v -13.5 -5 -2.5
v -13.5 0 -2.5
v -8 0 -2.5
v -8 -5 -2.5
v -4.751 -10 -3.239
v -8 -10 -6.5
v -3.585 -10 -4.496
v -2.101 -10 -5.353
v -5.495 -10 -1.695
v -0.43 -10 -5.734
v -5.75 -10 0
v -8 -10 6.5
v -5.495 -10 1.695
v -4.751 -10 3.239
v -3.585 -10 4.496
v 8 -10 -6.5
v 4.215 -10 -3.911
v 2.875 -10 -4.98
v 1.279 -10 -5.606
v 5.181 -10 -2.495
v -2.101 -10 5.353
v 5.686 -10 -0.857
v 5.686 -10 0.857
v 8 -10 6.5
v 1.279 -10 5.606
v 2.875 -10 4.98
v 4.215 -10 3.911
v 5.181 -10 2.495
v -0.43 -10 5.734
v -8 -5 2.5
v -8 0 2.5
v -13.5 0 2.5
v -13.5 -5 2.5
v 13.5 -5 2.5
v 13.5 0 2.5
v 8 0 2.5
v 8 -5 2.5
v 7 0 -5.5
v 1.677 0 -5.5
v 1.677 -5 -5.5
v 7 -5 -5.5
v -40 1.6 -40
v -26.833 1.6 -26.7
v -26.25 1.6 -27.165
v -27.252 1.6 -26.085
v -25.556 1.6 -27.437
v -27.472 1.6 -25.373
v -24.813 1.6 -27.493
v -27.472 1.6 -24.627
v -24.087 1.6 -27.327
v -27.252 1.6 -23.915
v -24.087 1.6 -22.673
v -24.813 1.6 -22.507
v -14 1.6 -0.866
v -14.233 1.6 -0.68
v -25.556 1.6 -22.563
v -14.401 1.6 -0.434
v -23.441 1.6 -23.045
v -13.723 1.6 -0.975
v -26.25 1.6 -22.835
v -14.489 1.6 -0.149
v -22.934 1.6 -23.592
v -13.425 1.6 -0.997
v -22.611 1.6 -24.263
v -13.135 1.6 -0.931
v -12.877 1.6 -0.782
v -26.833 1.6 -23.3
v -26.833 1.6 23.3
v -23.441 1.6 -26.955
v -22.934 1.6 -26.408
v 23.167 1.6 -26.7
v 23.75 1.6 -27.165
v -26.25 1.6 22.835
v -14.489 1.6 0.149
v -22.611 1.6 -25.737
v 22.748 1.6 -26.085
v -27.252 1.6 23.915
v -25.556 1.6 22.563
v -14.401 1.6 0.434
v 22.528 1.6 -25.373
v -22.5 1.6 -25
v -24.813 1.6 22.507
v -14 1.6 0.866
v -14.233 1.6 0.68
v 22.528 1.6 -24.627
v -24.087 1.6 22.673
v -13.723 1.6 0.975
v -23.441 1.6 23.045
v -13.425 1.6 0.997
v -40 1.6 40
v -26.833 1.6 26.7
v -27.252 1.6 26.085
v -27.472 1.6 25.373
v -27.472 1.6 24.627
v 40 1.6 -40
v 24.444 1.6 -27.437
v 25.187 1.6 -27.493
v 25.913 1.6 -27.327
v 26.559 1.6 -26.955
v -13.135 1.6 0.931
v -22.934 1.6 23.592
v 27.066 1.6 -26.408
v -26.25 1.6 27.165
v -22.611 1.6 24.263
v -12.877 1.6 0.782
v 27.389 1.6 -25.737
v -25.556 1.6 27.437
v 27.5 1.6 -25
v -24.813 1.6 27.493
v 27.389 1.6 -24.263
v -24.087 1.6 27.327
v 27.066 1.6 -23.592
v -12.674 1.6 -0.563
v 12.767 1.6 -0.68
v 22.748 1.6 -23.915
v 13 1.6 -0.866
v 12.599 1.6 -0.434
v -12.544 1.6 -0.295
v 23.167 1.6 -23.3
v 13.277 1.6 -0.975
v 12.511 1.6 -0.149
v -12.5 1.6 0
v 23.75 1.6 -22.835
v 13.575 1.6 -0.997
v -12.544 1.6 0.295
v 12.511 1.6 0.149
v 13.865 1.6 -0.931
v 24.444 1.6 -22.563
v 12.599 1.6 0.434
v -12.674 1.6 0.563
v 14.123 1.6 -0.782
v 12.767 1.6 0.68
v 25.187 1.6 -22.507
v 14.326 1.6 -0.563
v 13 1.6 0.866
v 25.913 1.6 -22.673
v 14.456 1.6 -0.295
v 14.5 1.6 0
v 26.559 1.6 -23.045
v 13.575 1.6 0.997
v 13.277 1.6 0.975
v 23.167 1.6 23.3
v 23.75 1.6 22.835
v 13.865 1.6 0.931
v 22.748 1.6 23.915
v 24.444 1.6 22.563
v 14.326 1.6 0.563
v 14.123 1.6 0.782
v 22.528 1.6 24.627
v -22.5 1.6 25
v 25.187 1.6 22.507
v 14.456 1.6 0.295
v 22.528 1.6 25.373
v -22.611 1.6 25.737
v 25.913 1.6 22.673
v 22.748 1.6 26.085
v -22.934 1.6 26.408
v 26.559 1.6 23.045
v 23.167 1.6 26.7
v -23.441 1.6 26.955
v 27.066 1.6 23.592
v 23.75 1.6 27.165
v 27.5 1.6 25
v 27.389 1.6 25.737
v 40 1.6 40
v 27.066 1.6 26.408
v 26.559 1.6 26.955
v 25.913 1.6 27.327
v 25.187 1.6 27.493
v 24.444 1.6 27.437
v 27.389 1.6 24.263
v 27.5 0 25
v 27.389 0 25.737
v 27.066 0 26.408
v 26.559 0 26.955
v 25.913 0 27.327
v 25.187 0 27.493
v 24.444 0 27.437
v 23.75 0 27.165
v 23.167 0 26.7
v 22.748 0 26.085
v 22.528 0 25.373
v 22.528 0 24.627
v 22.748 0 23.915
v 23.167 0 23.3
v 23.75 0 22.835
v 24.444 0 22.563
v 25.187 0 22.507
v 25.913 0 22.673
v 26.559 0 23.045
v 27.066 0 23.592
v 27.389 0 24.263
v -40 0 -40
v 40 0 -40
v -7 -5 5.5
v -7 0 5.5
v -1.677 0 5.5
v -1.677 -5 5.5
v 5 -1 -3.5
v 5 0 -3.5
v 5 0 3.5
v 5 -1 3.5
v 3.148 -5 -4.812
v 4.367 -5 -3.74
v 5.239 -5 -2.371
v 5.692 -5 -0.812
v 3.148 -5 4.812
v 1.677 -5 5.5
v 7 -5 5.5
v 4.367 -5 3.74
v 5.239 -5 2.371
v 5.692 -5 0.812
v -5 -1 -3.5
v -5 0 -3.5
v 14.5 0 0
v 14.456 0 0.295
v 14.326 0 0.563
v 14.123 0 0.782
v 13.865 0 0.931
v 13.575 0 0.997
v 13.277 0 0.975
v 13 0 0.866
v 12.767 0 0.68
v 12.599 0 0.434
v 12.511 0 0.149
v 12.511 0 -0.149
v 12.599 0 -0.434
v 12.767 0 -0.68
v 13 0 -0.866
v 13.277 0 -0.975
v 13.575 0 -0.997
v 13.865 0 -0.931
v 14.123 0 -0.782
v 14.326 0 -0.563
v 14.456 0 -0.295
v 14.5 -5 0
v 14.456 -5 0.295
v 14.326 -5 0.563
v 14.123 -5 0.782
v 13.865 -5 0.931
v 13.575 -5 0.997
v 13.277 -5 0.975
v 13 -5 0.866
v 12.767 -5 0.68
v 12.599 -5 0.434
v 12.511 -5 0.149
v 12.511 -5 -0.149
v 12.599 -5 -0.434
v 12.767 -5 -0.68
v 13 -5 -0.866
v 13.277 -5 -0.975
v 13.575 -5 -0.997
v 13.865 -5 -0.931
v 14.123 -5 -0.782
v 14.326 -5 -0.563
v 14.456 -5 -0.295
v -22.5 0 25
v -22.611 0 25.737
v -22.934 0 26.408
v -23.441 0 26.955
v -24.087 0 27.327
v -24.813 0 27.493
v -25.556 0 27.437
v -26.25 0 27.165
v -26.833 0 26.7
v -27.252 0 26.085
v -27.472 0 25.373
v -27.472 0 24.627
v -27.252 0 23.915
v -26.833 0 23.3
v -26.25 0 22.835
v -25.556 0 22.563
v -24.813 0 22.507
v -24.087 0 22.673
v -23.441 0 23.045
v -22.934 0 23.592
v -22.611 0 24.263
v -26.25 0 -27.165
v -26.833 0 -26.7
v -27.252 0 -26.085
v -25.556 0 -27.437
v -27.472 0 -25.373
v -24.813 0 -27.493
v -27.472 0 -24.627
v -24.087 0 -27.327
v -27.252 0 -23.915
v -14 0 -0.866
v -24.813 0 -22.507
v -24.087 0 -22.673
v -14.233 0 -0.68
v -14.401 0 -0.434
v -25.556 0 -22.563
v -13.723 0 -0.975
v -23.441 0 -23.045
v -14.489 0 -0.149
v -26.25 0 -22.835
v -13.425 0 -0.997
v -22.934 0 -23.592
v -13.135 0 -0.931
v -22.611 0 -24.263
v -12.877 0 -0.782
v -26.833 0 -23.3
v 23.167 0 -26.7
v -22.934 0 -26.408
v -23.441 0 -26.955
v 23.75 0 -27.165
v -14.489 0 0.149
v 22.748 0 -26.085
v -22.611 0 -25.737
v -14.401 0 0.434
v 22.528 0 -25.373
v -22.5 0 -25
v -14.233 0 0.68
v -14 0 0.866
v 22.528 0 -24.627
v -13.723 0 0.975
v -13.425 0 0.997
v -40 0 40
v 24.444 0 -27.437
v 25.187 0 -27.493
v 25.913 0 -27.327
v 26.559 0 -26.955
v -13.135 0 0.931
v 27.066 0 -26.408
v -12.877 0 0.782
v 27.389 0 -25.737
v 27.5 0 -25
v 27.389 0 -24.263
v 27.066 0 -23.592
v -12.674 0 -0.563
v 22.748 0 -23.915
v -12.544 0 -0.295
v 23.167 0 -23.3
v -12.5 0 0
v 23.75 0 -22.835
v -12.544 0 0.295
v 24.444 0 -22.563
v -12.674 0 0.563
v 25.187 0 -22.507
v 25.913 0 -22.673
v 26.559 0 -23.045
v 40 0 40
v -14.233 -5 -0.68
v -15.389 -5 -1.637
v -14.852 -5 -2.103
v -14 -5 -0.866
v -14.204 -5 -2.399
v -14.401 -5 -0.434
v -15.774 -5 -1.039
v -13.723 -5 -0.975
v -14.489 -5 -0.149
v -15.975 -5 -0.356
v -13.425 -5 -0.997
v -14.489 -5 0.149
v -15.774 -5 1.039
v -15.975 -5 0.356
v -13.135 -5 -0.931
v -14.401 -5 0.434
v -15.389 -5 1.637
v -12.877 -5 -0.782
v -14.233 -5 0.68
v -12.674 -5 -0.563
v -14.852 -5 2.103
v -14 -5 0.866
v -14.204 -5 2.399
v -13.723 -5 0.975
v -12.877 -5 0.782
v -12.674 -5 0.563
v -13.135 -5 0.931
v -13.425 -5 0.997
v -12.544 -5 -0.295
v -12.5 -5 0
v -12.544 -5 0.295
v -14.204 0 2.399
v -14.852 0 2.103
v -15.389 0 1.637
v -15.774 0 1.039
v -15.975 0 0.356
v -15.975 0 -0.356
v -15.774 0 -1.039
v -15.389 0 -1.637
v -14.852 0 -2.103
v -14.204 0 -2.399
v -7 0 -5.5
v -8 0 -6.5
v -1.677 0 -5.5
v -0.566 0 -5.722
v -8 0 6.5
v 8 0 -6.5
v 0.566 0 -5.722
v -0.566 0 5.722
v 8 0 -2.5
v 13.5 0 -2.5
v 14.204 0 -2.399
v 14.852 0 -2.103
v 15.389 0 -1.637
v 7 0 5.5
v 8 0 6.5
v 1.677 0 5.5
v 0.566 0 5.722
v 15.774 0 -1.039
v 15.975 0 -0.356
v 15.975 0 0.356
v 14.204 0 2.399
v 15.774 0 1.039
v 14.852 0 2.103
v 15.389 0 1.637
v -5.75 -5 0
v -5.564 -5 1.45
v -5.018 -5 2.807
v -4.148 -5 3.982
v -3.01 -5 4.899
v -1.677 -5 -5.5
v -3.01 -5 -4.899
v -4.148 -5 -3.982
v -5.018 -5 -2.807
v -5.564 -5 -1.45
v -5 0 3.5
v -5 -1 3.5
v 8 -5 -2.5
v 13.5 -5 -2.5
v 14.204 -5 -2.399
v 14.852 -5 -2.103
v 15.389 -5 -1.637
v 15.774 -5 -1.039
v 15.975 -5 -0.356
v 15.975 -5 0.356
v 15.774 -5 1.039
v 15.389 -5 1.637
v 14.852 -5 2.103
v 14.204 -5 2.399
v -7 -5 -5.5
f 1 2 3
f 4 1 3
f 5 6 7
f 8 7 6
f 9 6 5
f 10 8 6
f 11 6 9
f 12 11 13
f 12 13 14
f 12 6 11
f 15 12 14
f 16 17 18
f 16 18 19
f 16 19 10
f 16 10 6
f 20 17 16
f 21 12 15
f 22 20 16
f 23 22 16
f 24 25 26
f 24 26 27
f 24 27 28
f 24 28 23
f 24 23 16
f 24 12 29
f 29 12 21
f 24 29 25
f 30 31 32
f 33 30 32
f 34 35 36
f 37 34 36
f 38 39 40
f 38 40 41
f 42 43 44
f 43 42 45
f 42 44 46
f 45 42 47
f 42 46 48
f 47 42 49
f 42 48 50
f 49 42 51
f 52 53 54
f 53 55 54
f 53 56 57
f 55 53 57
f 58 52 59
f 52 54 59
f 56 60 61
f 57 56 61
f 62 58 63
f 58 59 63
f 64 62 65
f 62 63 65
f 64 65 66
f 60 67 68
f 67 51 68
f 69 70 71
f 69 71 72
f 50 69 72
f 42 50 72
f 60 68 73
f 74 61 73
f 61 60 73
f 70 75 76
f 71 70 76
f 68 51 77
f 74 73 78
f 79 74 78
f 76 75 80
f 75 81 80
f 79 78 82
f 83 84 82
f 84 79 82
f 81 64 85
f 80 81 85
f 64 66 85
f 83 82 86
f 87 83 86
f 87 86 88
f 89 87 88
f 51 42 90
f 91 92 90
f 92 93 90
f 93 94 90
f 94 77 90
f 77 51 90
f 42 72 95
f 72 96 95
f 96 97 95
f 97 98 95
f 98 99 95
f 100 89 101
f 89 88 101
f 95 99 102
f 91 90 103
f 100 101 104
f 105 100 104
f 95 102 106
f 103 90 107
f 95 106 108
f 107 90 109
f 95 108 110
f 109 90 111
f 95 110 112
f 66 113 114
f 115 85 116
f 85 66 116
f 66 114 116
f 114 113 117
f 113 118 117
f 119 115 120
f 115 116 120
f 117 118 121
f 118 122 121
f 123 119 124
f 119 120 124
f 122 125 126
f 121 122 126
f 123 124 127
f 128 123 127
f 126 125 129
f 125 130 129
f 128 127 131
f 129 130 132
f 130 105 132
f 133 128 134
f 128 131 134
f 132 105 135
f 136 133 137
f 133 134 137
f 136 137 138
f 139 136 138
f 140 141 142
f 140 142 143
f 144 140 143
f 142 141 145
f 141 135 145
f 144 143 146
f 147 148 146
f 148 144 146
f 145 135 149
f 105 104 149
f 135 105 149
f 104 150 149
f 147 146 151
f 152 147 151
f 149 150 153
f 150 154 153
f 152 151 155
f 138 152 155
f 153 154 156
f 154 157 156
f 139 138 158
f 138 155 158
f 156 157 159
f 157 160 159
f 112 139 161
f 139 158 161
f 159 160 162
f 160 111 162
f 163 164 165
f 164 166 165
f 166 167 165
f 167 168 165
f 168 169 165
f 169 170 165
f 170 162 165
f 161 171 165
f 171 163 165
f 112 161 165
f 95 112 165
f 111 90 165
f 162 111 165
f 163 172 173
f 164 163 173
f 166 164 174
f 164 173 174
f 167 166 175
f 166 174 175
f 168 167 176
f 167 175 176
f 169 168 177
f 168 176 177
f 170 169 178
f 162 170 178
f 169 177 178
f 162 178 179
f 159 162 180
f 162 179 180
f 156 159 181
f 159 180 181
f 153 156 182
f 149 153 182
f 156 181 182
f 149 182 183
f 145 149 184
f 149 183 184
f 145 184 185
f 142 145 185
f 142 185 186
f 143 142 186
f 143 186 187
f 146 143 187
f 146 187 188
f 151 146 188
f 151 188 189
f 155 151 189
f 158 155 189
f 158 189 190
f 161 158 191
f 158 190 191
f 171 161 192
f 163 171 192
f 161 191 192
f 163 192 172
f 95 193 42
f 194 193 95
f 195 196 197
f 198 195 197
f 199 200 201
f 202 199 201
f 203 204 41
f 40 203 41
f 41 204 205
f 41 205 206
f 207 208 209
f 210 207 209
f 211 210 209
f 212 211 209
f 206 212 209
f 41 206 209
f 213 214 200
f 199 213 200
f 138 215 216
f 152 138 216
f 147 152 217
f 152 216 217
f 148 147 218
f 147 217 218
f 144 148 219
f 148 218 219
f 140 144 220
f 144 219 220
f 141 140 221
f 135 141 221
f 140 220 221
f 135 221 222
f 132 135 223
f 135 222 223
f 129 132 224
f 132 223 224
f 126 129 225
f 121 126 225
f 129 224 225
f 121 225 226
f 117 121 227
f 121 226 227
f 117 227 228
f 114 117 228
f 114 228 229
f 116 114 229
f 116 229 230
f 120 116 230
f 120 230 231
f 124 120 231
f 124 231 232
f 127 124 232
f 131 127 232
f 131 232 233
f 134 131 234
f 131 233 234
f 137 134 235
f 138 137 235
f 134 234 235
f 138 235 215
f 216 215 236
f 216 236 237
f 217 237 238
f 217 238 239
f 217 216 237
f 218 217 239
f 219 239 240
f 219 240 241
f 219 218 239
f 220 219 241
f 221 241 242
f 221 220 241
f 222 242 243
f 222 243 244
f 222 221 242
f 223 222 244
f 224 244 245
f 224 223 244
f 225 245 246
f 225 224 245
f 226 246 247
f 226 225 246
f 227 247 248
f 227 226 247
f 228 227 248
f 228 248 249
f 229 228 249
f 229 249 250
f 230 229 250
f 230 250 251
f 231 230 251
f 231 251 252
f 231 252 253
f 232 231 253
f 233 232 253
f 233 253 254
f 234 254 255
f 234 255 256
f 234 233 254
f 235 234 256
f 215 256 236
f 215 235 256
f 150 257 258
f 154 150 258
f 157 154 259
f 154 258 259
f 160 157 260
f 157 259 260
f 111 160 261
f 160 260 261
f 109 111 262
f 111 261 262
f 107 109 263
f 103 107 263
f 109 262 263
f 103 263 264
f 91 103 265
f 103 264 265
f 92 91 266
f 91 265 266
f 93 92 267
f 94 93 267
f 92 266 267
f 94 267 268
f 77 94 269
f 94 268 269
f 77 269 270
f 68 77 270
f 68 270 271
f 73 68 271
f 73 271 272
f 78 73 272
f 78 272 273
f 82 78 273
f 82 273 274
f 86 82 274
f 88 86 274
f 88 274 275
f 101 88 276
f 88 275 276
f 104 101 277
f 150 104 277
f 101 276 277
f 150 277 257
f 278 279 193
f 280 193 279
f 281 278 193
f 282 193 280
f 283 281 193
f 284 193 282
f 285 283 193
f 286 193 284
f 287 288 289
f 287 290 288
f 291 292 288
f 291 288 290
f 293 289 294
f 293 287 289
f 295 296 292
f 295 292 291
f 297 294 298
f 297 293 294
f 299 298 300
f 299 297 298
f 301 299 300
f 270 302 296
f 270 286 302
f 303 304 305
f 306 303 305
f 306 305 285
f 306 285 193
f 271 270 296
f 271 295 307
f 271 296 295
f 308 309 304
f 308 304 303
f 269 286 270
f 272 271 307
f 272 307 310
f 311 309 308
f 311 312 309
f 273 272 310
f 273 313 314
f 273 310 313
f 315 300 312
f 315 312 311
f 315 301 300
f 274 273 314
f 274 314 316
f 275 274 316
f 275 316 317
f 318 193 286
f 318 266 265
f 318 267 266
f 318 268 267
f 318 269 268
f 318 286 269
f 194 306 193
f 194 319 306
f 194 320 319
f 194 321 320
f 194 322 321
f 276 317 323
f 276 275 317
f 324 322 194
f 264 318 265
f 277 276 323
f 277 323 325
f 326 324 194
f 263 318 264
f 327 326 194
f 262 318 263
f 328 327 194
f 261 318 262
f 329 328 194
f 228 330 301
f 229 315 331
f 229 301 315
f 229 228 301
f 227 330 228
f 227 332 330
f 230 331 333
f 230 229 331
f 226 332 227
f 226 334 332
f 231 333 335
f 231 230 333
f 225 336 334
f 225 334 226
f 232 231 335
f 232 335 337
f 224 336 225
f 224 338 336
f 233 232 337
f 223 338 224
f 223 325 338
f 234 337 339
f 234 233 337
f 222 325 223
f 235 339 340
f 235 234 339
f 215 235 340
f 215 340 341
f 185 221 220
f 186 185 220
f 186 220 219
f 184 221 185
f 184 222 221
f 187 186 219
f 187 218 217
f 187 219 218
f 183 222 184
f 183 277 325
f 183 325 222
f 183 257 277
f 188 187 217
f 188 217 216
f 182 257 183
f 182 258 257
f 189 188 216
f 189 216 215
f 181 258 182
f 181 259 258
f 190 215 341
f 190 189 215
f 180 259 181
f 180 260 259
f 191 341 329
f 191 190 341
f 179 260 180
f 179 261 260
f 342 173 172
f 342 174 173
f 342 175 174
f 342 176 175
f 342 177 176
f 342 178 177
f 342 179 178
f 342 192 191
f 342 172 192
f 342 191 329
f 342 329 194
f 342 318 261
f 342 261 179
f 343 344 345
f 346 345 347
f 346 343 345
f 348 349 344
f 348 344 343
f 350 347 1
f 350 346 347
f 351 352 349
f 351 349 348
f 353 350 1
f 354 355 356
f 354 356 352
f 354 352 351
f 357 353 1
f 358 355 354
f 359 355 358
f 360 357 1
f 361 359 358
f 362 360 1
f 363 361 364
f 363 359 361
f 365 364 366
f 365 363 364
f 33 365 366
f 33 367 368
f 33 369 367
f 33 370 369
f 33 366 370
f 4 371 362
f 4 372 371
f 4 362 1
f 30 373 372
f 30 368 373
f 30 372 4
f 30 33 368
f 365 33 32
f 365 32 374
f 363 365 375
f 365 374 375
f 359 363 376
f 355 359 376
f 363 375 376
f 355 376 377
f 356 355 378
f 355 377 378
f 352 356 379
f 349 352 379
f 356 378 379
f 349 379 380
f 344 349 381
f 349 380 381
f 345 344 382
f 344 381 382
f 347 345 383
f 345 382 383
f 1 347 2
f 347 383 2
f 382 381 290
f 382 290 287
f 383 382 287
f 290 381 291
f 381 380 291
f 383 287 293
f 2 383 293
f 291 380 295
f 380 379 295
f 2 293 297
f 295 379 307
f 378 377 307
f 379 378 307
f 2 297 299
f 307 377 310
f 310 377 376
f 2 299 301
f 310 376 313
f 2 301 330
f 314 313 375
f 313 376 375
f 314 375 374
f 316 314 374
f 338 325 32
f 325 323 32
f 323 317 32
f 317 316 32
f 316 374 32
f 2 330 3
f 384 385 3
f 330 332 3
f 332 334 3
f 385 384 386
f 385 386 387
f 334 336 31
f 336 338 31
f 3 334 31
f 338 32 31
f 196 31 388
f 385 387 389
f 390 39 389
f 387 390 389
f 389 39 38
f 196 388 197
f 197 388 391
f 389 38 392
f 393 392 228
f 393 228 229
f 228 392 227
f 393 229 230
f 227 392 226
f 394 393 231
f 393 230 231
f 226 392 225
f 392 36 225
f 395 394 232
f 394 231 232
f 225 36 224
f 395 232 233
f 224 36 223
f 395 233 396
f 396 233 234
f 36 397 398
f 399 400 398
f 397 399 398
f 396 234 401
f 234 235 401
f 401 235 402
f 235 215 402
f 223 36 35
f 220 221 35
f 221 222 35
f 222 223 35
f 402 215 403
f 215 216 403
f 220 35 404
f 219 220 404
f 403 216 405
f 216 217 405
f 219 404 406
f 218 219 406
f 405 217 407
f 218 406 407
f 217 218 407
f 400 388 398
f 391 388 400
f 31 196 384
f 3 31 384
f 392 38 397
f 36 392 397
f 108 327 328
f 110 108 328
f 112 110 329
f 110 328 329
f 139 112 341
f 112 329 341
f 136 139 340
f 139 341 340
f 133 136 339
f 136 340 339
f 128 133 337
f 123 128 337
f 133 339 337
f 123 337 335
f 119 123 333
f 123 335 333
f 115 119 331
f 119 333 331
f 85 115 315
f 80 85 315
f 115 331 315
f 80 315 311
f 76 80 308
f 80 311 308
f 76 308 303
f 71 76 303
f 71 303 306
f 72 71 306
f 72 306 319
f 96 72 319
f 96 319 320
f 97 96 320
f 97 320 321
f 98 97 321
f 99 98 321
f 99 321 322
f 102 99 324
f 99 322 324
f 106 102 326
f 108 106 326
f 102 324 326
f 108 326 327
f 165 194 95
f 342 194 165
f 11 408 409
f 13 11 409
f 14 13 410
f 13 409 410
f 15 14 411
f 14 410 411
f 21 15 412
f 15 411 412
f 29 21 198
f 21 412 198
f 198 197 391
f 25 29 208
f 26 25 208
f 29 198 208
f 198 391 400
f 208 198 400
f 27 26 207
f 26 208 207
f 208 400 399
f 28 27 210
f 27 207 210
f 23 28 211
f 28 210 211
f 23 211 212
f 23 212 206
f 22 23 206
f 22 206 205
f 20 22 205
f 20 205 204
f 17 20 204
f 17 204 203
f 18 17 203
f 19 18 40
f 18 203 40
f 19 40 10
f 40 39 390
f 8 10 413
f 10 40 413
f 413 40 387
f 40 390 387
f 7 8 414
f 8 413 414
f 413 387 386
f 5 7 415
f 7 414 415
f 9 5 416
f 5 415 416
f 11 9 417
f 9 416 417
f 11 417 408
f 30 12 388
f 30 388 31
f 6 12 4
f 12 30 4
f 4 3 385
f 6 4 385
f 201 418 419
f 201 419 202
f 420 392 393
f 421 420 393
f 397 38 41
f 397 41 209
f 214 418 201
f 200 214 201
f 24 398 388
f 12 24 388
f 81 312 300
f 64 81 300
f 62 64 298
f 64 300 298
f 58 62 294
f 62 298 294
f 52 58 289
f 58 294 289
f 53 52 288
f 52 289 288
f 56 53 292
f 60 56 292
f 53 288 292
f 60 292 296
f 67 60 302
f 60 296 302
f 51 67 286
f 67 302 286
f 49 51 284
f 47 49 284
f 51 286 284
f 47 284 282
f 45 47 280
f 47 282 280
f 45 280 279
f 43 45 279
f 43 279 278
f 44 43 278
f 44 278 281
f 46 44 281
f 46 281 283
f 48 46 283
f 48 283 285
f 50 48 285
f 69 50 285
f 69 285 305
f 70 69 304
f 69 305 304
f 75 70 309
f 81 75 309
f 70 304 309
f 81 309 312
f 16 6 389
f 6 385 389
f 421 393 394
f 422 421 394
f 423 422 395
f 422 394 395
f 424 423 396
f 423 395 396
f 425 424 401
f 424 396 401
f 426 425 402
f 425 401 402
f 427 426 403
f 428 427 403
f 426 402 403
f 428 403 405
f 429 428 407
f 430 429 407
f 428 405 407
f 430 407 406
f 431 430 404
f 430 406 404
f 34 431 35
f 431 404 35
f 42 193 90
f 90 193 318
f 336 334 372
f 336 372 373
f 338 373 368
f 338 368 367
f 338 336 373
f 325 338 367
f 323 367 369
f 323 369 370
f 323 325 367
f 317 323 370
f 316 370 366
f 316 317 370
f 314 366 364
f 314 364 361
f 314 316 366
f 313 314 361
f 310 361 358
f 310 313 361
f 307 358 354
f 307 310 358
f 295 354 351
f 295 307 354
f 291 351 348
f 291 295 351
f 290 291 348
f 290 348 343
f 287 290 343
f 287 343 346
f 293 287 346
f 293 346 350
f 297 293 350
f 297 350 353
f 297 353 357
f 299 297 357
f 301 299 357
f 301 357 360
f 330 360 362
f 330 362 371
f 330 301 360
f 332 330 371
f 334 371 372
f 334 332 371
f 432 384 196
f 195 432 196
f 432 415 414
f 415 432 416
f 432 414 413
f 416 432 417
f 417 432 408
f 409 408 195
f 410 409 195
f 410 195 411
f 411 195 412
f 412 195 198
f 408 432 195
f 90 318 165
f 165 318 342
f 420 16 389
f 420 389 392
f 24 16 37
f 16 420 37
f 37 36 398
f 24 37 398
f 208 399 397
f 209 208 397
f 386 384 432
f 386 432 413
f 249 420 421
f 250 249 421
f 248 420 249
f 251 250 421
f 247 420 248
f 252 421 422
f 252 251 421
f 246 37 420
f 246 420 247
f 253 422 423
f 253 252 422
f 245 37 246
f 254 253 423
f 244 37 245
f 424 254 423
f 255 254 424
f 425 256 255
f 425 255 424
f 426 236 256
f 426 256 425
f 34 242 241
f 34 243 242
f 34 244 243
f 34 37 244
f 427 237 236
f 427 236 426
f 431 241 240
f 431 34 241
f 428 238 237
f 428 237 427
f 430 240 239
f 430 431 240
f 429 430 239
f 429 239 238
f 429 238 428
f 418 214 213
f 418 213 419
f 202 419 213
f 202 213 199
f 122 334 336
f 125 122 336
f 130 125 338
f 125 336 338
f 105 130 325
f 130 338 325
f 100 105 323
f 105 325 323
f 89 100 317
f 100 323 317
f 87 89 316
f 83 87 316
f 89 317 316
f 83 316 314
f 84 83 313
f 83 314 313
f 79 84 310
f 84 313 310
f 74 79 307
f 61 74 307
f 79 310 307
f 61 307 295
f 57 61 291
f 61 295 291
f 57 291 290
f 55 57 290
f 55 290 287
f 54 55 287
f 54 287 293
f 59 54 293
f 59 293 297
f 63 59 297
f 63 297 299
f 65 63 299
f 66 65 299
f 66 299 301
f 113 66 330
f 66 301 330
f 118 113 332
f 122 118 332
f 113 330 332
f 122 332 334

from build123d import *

# Parameters (mm, degrees)
F0_W     = 80
F0_H     = 80
F0_R     = 2.5
F0_R_2   = 1
F0_W_2   = 10
F0_H_2   = 7
F1_DEPTH = 1.6
F2_DEPTH = 1
F3_R     = 1
F3_W     = 14
F3_H     = 11
F4_DEPTH = 5
F5_W     = 14
F5_H     = 11
F6_DEPTH = 5
F8_D     = 11.5


with BuildPart() as f1:
    # F0 (on Front) → F1 (new body)
    with BuildSketch(Plane.XZ):
        Rectangle(F0_W, F0_H)
        with Locations((-25, -25)):
            Circle(F0_R, mode=Mode.SUBTRACT)
        with Locations((25, -25)):
            Circle(F0_R, mode=Mode.SUBTRACT)
        with Locations((-13.5, 0)):
            Circle(F0_R_2, mode=Mode.SUBTRACT)
        with Locations((-25, 25)):
            Circle(F0_R, mode=Mode.SUBTRACT)
        Rectangle(F0_W_2, F0_H_2, mode=Mode.SUBTRACT)
        with Locations((13.5, 0)):
            Circle(F0_R_2, mode=Mode.SUBTRACT)
        with Locations((25, 25)):
            Circle(F0_R, mode=Mode.SUBTRACT)
        Rectangle(F0_W_2, F0_H_2)
    extrude(amount=-F1_DEPTH)


with BuildPart() as f2:
    # F0 (on Front) → F2 (new body)
    with BuildSketch(Plane.XZ):
        Rectangle(F0_W_2, F0_H_2)
    extrude(amount=F2_DEPTH)


with BuildPart() as f4:
    # F3 (on face) → F4 (new body)
    with BuildSketch(Plane.XZ):
        with BuildLine():
            Line((8, -2.5), (13.5, -2.5))
            ThreePointArc((13.5, -2.5), (16, 0), (13.5, 2.5))
            Line((13.5000000682, 2.5), (8, 2.5))
            Line((8, 2.5), (8, 6.5))
            Line((8, 6.5), (-8, 6.5))
            Line((-8, 6.5), (-8, 2.5))
            Line((-8, 2.5), (-13.5, 2.5))
            ThreePointArc((-13.5, 2.5), (-16, 3.41e-08), (-13.5000000682, -2.5))
            Line((-13.5000000682, -2.5), (-8, -2.5))
            Line((-8, -2.5), (-8, -6.5))
            Line((-8, -6.5), (8, -6.5))
            Line((8, -6.5), (8, -2.5))
        make_face()
        with Locations((-13.5, 0)):
            Circle(F3_R, mode=Mode.SUBTRACT)
        Rectangle(F3_W, F3_H, mode=Mode.SUBTRACT)
        with Locations((13.5, 0)):
            Circle(F3_R, mode=Mode.SUBTRACT)
    extrude(amount=F4_DEPTH)

    # F5 (on face) → F6 (join)
    with BuildSketch(Plane.XZ.offset(5)):
        Polygon((8, 6.5), (-8, 6.5), (-8, 2.5), (-8, -2.5), (-8, -6.5), (8, -6.5), (8, -2.5), (8, 2.5), align=None)
        Rectangle(F5_W, F5_H, mode=Mode.SUBTRACT)
        Rectangle(F5_W, F5_H)
    extrude(amount=F6_DEPTH)

    # F8 (through all)
    with Locations(Plane.XZ.offset(10)):
        with Locations((0, 0)):
            Hole(F8_D / 2)


solid = Compound([f1.part, f2.part, f4.part])
